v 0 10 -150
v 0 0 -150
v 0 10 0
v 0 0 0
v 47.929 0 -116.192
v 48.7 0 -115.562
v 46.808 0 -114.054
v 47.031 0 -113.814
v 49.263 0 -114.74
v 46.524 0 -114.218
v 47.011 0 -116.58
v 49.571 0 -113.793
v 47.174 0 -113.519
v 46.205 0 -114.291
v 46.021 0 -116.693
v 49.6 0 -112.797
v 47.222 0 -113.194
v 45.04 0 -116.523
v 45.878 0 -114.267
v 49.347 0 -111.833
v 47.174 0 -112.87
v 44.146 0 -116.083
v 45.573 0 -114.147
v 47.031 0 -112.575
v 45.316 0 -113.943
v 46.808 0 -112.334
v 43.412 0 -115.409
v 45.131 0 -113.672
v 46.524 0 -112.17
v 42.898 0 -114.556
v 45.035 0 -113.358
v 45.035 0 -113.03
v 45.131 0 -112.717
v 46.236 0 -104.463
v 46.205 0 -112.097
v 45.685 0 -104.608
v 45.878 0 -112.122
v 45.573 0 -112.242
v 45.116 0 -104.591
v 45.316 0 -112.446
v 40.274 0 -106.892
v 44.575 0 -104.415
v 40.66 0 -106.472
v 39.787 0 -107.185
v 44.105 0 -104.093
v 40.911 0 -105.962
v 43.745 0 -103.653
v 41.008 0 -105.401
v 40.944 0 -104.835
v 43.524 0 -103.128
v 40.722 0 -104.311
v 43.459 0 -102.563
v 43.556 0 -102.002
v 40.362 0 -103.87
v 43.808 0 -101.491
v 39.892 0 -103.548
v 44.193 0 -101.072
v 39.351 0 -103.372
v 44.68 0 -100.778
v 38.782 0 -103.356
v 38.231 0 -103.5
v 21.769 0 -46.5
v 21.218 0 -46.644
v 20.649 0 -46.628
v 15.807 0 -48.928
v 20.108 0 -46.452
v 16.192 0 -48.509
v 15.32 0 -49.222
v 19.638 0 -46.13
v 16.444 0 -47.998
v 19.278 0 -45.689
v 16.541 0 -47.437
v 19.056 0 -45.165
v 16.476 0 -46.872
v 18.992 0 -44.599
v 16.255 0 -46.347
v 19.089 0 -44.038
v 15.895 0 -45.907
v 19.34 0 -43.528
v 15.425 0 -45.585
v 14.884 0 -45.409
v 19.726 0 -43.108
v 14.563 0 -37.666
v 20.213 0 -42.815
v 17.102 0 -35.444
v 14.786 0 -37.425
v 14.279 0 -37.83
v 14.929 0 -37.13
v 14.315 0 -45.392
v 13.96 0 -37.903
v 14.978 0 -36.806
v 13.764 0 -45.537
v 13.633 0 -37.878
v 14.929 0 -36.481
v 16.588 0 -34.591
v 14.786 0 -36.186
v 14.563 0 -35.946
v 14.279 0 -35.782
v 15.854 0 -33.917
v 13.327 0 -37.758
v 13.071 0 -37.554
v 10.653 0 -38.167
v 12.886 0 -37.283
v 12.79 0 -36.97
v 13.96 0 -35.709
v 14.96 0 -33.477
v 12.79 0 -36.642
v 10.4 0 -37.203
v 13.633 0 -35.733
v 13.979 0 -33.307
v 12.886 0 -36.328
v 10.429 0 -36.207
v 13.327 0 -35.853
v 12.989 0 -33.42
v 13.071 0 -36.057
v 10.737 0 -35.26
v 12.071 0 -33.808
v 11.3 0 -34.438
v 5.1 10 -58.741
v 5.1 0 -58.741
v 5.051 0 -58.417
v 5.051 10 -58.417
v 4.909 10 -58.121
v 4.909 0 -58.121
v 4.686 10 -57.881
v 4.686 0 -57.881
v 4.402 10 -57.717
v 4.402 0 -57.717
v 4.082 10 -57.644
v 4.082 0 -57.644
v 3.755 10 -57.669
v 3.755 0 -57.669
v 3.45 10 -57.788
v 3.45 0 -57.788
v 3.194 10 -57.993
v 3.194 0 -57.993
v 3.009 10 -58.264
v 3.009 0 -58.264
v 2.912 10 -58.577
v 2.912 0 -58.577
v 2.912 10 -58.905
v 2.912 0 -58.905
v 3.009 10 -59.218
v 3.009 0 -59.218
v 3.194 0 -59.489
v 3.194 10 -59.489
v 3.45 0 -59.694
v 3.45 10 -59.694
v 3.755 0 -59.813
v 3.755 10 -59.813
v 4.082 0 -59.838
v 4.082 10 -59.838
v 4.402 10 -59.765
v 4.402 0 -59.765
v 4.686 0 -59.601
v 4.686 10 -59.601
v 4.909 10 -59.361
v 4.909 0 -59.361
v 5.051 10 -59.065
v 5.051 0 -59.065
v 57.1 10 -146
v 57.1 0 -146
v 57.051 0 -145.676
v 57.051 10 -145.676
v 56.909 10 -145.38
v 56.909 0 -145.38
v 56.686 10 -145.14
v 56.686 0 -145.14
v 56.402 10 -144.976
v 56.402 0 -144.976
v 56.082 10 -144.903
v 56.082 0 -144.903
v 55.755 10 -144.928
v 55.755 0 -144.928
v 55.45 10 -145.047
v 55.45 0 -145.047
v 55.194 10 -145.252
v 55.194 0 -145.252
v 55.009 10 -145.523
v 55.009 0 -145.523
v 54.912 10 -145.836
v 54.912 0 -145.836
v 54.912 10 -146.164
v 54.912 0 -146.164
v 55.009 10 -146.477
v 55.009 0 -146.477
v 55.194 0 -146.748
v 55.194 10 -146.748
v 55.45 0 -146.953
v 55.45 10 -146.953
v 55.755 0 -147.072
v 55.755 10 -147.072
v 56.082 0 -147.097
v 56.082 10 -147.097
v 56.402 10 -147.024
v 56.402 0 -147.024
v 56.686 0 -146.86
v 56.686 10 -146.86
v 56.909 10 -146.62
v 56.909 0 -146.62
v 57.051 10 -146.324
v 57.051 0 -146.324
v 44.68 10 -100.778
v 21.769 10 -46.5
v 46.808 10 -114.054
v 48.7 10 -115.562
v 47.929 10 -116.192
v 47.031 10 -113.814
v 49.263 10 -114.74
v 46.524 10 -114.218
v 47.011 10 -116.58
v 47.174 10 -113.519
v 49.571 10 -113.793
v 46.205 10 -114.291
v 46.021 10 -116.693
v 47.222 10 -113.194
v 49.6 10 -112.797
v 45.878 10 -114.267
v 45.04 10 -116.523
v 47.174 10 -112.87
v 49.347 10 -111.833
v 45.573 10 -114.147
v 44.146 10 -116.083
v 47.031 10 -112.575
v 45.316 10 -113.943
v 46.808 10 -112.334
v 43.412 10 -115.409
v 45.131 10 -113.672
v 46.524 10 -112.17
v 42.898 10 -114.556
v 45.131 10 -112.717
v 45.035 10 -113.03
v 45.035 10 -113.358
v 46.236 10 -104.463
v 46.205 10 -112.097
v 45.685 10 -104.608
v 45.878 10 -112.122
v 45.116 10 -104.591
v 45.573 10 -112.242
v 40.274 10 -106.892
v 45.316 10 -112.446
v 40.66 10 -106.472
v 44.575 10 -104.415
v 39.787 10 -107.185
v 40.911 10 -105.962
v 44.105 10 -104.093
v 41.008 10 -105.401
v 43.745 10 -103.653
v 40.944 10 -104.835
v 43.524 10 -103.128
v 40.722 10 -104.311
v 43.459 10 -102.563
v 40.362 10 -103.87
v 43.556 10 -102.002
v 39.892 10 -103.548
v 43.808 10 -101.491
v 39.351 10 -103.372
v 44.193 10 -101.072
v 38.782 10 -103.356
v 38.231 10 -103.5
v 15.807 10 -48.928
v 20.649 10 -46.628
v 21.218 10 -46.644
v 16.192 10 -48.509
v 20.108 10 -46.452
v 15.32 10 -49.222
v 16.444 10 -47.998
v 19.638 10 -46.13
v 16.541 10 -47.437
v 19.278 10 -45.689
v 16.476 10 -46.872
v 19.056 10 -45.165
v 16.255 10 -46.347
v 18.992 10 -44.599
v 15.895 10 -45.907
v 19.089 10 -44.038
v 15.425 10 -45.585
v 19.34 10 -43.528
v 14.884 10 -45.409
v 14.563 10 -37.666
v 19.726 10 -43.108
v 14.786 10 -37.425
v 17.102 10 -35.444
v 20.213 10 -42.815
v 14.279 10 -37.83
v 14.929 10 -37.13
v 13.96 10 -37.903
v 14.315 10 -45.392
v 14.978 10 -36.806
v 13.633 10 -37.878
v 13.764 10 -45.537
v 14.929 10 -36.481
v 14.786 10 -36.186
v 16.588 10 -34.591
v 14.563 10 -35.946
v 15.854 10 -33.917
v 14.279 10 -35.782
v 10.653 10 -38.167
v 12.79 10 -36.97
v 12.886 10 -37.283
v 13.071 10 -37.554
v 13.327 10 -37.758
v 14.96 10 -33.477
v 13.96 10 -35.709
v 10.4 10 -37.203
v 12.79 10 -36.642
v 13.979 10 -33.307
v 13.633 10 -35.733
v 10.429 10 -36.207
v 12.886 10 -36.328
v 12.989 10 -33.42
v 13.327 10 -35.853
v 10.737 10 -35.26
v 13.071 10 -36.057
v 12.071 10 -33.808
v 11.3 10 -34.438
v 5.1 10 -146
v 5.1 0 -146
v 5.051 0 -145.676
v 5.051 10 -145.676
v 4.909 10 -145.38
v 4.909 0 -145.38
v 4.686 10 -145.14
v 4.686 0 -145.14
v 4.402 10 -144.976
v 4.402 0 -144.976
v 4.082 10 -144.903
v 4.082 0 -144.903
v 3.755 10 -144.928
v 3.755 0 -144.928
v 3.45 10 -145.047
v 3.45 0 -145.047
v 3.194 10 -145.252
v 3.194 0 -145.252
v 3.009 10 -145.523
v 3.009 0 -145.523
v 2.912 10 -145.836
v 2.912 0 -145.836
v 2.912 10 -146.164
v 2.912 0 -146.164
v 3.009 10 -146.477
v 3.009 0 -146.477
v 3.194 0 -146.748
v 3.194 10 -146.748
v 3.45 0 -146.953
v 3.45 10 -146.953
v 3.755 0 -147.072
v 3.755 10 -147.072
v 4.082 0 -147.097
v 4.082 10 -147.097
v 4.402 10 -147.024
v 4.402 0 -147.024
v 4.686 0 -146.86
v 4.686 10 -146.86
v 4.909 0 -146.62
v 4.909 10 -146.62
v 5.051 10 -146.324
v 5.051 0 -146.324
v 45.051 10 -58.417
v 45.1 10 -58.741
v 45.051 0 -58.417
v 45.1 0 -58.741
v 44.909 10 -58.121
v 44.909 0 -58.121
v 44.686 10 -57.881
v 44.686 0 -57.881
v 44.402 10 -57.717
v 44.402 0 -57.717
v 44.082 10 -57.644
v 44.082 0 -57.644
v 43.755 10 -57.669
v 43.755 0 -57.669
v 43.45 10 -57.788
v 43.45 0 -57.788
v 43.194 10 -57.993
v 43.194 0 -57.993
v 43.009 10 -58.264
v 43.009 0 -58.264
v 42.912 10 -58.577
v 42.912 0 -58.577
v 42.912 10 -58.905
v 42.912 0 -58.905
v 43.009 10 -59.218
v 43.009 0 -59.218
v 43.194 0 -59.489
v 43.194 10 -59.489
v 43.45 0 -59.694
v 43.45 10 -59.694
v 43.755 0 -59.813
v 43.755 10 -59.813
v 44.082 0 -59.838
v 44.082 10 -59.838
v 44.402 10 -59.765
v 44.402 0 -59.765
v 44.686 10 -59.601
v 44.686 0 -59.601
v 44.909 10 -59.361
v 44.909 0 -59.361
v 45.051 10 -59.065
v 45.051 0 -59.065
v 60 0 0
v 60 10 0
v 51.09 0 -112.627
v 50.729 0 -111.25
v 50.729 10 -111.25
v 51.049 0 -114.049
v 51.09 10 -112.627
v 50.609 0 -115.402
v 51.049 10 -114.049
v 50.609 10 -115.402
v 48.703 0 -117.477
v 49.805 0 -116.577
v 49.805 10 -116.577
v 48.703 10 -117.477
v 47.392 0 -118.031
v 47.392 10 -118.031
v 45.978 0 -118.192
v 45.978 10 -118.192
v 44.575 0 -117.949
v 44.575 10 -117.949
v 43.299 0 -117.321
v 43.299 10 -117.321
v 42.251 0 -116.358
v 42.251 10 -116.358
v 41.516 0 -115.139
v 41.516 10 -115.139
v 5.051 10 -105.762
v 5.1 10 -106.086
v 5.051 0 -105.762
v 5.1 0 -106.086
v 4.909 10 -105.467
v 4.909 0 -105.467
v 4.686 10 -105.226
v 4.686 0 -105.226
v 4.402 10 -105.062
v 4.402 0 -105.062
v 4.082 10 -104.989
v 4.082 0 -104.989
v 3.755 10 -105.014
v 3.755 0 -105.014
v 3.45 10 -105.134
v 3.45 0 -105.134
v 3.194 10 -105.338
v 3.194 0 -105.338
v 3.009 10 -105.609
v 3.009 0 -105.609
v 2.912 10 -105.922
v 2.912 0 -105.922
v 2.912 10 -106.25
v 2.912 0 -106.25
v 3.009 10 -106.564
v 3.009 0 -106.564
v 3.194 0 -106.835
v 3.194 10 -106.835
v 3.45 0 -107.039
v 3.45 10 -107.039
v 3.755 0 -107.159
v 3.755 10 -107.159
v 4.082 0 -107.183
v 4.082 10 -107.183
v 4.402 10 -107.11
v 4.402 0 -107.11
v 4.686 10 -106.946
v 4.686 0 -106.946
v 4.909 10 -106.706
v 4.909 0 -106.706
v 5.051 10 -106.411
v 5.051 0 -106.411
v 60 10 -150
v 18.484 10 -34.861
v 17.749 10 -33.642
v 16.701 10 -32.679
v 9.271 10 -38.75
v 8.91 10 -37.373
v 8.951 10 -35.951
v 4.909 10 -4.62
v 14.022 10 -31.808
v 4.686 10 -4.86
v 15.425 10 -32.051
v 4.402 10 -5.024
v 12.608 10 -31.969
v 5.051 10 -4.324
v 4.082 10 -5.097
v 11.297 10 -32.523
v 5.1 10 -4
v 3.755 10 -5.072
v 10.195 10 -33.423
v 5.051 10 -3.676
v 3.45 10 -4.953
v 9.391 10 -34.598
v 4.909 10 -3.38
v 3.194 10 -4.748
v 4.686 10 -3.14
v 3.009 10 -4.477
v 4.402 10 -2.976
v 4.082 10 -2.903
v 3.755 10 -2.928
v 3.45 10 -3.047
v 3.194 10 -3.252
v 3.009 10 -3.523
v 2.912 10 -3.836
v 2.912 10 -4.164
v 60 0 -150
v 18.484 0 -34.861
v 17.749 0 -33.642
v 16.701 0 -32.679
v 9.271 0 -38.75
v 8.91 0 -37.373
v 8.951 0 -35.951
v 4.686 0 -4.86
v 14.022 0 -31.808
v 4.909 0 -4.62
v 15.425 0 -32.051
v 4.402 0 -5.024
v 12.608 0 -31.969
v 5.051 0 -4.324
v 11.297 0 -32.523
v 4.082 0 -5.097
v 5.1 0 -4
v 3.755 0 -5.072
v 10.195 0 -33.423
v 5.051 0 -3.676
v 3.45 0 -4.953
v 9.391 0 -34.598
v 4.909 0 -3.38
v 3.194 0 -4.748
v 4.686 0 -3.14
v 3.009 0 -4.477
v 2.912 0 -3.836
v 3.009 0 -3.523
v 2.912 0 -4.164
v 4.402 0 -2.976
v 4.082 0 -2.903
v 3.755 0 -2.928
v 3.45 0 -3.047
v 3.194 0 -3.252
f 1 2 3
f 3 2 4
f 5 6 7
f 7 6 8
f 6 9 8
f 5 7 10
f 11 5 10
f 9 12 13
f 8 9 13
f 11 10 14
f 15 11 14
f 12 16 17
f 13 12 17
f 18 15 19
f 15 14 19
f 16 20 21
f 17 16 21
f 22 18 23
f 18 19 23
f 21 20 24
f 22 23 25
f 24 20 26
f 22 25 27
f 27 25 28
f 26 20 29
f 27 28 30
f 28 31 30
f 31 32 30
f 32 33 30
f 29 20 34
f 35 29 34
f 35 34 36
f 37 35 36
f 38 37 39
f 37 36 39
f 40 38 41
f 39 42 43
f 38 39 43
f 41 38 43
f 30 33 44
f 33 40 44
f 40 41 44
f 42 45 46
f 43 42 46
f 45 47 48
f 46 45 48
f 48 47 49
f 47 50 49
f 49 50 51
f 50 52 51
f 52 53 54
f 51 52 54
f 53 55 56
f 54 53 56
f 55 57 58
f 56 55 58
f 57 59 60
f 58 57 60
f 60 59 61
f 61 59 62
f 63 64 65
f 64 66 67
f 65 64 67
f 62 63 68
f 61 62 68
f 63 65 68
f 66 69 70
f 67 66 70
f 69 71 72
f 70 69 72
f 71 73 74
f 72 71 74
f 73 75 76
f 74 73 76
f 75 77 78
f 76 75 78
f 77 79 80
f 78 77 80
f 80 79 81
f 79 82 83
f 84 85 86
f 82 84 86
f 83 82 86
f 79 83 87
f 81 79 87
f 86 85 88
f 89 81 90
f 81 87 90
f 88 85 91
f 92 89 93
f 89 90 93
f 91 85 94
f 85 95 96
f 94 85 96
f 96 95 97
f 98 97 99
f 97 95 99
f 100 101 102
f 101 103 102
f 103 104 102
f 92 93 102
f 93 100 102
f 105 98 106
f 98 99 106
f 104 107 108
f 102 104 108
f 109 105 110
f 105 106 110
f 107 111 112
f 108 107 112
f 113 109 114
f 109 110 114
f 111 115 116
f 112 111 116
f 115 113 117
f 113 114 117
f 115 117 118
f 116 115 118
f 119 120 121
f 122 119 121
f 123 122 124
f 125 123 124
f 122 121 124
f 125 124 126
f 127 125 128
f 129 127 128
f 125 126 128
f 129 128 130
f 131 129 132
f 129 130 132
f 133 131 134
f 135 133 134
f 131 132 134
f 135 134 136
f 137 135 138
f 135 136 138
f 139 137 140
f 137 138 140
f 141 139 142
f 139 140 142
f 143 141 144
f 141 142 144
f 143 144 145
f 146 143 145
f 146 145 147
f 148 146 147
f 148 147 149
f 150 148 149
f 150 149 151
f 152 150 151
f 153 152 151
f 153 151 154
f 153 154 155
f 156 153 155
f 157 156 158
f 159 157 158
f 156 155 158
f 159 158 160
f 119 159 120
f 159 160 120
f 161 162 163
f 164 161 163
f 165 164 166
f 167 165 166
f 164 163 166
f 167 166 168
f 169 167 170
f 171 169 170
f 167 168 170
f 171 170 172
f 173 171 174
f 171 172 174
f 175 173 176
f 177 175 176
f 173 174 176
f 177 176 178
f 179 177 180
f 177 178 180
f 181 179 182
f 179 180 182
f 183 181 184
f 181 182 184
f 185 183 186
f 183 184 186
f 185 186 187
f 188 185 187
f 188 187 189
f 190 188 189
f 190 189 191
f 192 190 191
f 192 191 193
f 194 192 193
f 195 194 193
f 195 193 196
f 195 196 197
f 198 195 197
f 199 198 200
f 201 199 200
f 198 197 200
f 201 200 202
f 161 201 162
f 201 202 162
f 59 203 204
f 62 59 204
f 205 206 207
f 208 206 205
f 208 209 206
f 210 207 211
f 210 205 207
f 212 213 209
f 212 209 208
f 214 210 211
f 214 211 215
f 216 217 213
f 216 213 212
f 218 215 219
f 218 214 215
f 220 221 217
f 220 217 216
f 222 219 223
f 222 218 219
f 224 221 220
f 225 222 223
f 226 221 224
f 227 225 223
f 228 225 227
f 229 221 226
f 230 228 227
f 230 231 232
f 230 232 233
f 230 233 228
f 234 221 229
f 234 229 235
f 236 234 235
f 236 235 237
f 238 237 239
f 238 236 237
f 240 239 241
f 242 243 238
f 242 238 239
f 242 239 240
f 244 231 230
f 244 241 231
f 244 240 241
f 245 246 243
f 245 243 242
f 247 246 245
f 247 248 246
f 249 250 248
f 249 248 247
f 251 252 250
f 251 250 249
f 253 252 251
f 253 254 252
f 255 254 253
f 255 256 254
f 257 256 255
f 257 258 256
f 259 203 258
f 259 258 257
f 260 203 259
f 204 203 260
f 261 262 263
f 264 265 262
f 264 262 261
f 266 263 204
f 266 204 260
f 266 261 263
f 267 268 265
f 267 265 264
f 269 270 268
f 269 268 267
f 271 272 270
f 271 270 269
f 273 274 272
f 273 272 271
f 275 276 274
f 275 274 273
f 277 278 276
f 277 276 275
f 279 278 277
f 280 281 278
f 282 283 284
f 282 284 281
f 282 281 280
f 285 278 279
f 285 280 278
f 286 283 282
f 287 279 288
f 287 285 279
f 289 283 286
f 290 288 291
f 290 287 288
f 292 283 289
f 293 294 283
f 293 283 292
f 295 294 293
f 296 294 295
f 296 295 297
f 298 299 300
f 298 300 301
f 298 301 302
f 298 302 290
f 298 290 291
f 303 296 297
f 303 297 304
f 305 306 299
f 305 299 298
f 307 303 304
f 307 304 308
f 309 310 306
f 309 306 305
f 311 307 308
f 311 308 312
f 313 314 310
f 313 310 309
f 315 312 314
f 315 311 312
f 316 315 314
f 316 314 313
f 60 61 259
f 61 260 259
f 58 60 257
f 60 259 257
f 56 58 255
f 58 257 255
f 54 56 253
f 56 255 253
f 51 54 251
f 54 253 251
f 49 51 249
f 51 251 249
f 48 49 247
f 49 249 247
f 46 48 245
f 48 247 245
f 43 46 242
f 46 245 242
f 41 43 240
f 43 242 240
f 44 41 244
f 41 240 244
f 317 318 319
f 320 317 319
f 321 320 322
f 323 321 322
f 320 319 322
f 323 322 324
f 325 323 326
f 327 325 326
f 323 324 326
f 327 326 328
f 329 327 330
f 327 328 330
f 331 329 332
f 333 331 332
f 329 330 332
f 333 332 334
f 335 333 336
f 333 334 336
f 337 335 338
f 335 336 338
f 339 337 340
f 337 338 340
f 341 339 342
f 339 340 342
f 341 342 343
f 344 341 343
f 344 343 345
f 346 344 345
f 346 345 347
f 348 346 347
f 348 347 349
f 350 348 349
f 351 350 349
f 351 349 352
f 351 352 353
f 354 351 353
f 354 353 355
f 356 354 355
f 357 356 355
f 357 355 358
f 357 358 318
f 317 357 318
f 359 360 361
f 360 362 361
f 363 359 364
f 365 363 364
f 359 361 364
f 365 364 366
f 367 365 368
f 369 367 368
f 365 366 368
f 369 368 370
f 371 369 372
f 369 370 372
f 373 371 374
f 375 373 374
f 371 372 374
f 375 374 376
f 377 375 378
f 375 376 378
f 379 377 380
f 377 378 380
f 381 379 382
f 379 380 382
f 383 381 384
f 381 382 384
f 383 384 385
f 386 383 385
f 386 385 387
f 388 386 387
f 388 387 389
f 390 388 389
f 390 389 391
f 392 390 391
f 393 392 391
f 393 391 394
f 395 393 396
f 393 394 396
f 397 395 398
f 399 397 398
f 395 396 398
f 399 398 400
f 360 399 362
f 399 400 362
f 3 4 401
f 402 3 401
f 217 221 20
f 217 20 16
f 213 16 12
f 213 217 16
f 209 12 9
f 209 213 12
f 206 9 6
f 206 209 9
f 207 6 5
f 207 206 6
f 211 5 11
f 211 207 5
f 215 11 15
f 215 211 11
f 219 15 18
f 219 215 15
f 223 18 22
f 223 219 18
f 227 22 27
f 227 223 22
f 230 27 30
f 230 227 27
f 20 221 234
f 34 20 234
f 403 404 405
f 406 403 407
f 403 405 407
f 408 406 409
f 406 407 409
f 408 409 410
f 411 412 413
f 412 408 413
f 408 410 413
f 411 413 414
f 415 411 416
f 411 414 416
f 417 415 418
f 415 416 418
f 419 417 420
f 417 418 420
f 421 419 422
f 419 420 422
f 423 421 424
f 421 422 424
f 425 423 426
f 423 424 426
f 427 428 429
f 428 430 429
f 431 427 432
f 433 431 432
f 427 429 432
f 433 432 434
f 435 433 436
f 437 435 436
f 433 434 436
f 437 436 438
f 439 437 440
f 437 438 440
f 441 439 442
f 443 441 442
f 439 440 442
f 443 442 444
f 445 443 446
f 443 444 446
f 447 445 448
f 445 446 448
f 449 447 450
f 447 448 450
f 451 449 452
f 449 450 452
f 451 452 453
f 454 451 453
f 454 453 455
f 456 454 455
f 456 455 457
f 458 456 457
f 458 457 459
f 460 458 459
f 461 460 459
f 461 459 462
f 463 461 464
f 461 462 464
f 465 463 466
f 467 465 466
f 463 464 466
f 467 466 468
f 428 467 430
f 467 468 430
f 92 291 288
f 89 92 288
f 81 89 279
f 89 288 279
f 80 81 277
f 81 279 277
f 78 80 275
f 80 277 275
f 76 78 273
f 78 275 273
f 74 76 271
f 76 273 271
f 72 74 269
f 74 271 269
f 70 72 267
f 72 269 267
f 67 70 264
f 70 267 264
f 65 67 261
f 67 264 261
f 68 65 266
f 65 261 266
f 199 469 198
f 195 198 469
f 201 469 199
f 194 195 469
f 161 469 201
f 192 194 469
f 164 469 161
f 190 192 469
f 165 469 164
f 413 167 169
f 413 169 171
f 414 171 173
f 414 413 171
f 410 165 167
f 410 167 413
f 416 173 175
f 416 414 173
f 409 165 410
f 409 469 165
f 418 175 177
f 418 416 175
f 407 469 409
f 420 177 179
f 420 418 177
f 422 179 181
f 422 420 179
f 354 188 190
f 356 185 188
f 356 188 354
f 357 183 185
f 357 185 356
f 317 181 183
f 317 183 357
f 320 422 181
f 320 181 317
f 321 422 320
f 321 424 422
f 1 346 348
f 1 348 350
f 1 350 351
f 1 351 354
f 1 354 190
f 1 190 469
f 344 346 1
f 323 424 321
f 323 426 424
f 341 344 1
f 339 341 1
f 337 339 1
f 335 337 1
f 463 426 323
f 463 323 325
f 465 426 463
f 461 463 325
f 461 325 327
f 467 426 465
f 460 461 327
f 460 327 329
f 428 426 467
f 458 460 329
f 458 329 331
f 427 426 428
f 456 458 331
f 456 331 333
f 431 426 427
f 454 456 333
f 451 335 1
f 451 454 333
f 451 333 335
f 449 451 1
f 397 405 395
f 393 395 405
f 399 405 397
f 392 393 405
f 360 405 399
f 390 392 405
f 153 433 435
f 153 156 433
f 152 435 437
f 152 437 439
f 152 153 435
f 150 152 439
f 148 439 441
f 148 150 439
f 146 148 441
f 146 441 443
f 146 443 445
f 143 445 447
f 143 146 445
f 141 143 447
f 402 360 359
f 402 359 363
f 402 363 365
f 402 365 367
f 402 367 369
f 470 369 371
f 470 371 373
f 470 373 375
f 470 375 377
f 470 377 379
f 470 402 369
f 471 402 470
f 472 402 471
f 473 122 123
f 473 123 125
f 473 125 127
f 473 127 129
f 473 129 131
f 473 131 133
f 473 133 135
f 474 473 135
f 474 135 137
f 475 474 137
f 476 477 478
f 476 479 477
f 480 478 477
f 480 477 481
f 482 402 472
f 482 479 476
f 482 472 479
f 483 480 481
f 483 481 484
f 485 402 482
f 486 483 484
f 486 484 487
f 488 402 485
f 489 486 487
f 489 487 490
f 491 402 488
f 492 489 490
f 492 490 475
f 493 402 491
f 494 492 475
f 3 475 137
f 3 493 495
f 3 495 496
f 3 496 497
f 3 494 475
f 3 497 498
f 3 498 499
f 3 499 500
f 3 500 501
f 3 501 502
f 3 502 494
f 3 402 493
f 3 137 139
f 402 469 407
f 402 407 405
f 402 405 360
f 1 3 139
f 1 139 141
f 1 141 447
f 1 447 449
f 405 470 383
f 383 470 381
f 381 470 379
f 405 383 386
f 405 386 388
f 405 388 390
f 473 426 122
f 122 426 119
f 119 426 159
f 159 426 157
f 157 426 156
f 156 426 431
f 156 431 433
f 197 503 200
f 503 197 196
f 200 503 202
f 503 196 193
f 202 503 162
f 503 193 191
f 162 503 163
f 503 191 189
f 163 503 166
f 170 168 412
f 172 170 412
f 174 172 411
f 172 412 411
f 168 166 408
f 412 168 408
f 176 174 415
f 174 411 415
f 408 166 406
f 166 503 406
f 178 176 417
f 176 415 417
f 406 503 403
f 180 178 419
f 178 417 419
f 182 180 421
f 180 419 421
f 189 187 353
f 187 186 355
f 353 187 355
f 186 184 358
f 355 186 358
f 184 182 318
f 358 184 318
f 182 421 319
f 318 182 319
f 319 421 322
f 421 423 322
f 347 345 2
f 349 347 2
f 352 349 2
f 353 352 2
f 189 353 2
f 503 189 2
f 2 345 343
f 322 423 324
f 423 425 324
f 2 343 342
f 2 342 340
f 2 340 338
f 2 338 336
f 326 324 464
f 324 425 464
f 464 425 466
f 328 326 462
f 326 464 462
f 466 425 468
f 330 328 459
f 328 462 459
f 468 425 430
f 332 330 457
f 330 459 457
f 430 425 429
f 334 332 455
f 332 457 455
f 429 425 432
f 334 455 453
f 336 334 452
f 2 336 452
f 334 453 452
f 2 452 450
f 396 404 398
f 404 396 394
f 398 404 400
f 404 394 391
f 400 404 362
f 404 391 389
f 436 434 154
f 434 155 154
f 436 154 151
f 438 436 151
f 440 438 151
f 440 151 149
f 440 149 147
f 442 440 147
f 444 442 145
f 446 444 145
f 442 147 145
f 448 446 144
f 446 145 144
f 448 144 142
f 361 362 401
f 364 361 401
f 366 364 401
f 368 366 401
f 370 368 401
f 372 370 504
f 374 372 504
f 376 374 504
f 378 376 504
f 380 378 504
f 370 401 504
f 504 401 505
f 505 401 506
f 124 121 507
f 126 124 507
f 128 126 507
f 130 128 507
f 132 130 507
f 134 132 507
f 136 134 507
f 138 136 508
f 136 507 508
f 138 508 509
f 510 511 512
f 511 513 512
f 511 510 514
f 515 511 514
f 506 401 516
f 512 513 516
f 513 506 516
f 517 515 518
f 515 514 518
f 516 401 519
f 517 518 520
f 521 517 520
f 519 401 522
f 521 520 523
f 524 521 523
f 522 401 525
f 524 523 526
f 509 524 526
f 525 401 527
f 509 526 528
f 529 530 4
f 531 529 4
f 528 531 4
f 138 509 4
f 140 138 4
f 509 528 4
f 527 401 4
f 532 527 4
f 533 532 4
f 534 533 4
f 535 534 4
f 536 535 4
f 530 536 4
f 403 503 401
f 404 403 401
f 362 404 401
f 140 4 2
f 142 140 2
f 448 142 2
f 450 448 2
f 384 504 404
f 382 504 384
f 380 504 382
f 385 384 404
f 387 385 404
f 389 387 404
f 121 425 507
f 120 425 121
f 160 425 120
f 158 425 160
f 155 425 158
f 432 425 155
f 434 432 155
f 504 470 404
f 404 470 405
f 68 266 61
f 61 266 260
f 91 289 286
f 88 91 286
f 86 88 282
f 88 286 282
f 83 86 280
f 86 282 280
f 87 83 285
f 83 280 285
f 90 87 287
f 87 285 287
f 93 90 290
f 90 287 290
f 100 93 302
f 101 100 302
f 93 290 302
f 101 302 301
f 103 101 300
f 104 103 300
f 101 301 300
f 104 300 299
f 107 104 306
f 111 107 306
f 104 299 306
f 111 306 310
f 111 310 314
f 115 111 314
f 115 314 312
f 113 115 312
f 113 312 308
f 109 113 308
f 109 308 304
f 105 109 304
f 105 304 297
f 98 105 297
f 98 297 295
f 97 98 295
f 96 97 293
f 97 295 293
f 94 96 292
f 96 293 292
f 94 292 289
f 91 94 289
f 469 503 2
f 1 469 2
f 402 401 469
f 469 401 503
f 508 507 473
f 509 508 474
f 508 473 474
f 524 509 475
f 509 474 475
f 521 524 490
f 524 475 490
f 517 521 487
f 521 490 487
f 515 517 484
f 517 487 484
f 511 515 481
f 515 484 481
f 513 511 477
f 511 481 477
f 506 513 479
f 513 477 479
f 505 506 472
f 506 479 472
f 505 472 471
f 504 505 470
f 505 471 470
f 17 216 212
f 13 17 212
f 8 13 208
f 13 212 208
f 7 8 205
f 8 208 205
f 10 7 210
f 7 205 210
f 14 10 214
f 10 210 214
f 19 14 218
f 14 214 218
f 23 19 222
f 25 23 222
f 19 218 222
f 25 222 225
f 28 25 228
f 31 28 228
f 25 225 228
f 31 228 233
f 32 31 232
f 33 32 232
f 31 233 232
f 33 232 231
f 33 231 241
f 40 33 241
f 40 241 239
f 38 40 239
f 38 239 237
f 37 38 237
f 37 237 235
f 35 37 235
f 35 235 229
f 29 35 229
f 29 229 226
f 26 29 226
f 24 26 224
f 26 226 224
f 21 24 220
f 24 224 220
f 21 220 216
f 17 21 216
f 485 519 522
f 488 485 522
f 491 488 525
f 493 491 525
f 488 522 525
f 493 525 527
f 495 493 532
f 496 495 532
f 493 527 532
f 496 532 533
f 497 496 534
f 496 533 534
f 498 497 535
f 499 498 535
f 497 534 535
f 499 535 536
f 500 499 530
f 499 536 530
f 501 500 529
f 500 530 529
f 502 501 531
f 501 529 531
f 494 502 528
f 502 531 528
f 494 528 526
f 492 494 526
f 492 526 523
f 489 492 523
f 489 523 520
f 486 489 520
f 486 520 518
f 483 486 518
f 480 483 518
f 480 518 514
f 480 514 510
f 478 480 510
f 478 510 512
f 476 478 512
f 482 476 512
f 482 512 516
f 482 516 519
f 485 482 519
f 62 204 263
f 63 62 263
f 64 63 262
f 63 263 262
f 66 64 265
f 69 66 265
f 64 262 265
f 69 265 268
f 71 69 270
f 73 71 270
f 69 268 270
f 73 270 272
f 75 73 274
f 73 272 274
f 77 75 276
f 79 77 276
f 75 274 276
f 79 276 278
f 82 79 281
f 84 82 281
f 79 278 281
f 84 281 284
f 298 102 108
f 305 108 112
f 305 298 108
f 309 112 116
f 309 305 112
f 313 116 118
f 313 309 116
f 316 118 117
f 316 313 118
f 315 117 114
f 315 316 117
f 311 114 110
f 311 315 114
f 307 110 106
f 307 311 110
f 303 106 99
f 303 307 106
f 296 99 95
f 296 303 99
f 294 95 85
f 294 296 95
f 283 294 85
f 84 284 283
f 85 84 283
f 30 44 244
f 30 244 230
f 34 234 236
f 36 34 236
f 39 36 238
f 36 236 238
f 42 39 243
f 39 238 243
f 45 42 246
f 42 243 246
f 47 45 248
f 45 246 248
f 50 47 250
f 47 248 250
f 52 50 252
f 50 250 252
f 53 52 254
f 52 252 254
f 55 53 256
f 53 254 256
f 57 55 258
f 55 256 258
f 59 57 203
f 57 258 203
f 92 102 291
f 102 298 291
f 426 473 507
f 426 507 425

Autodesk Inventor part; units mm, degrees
ref_plane "YZ Plane" through (0, 0, 0) normal (1, 0, 0) x (0, 1, 0)
ref_plane "XZ Plane" through (0, 0, 0) normal (0, 1, 0) x (-1, 0, 0)
ref_plane "XY Plane" through (0, 0, 0) normal (0, 0, 1) x (1, 0, 0)
sketch "Sketch1" plane through (0, 0, 0) normal (0, 1, 0) x (-1, 0, 0)
  line L0 (0, 0) -> (-60, 0)
  line L1 (-60, 0) -> (-60, -150)
  line L2 (-60, -150) -> (0, -150)
  line L3 (0, -150) -> (0, 0)
  dimension "d0" = 150
  dimension "d1" = 60
extrude "Extrusion1" add sketch "Sketch1" along normal blind 10
sketch "Sketch2" plane through (0, 0, 0) normal (0, -1, 0) x (1, 0, 0)
  circle A0 centre (4, -146) radius 1.325 projected
  circle A1 centre (56, -146) radius 1.325 projected
  circle A2 centre (4, -4) radius 1.325 projected
  circle A3 centre (4, -58.741) radius 1.325 projected
  circle A4 centre (44, -58.741) radius 1.325 projected
  circle A5 centre (4, -106.0864) radius 1.325 projected
  point P0 (0, 0)
sketch "Sketch3" plane through (0, 0, 0) normal (0, -1, 0) x (1, 0, 0)
  circle A0 centre (4, -146) radius 1.325 projected
  circle A1 centre (4, -146) radius 1.1
  circle A2 centre (56, -146) radius 1.325 projected
  circle A3 centre (56, -146) radius 1.1
  circle A4 centre (4, -106.0864) radius 1.1
  circle A5 centre (4, -58.741) radius 1.1
  circle A6 centre (44, -58.741) radius 1.1
  circle A7 centre (4, -4) radius 1.1
  point P0 (0, 0)
  dimension "d4" = 2.2
  dimension "d5" = 2.2
  dimension "d6" = 2.2
  dimension "d7" = 2.2
  dimension "d8" = 2.2
  dimension "d9" = 2.2
extrude "Extrusion2" cut sketch "Sketch3" against normal blind 10 contours A1 | A3 | A4 | A5 | A6 | A7
thread "Thread1" size "M2.5x0.45" class "6H" standard "ANSI Metric M Profile" length 10
thread "Thread2" size "M2.5x0.45" class "6H" standard "ANSI Metric M Profile" length 10
thread "Thread3" size "M2.5x0.45" class "6H" standard "ANSI Metric M Profile" length 10
thread "Thread4" size "M2.5x0.45" class "6H" standard "ANSI Metric M Profile" length 10
thread "Thread5" size "M2.5x0.45" class "6H" standard "ANSI Metric M Profile" length 10
thread "Thread6" size "M2.5x0.45" class "6H" standard "ANSI Metric M Profile" length 10
sketch "Sketch4" plane through (0, 10, 0) normal (0, 1, 0) x (1, 0, 0)
  circle A0 centre (13.8775, 36.8056) radius 1.1
  circle A1 centre (46.1225, 113.1944) radius 1.1
  arc A2 (36.6332, 8.5) -> (15.5373, 47.236) centre (30, 30) ccw projected
  arc A3 (30.5692, 97.5072) -> (51.5, 113.3668) centre (30, 120) ccw projected
  arc A4 (36.6332, 8.5) -> (15.5373, 47.236) centre (30, 30) ccw projected
  line L0 (9.2711, 38.75) -> (41.5161, 115.1389)
  line L1 (18.4839, 34.8611) -> (50.7289, 111.25)
  arc A5 (9.2711, 38.75) -> (18.4839, 34.8611) centre (13.8775, 36.8056) ccw
  arc A6 (50.7289, 111.25) -> (41.5161, 115.1389) centre (46.1225, 113.1944) ccw
  line L2 (30, 30) -> (22.4986, 30)
  line L3 (30, 120) -> (36.6332, 120)
  line L4 (41.5161, 115.1389) -> (50.7289, 111.25)
  line L5 (9.2711, 38.75) -> (18.4839, 34.8611)
  line L6 (30, 30) -> (13.8775, 36.8056)
  line L7 (46.1225, 113.1944) -> (30, 120)
  line L8 (13.8775, 36.8056) -> (46.1225, 113.1944)
  circle A7 centre (30, 30) radius 17.5
  circle A8 centre (30, 120) radius 17.5
  circle A9 centre (13.8775, 36.8056) radius 3.5
  circle A10 centre (46.1225, 113.1944) radius 3.5
  line L9 (10.653, 38.1667) -> (42.898, 114.5556)
  line L10 (49.347, 111.8333) -> (17.102, 35.4444)
  circle A11 centre (14.5419, 47.3795) radius 2
  line L11 (14.5419, 47.3795) -> (20.9909, 44.6573)
  circle A12 centre (20.9909, 44.6573) radius 2
  circle A13 centre (39.0091, 105.3427) radius 2
  circle A14 centre (45.4581, 102.6205) radius 2
  line L12 (39.0091, 105.3427) -> (45.4581, 102.6205)
  point P0 (0, 0)
  point P1 (45.6947, 112.181)
  point P2 (45.6631, 112.195)
  point P3 (44.4457, 110.1222)
  point P4 (44.7614, 109.9699)
  point P5 (13.7641, 45.5369)
  point P6 (15.3197, 49.2221)
  point P7 (38.2313, 103.5001)
  point P8 (39.7869, 107.1853)
  point P9 (46.2359, 104.4631)
  point P10 (44.6803, 100.7779)
  point P11 (21.7687, 46.4999)
  point P12 (20.2131, 42.8147)
  point P13 (38.1416, 107.1448)
  point P14 (37.4074, 104.145)
  point P15 (36.7532, 103.8555)
  point P16 (40.801, 106.2309)
  point P17 (37.1127, 104.7073)
  point P18 (47.3889, 118.0314)
  point P19 (22.8873, 45.2927)
  point P20 (22.5926, 45.855)
  point P21 (23.2468, 46.1445)
  point P22 (47.1543, 116.5389)
  dimension "d27" = 35
  dimension "d24" = 10
  dimension "d25" = 22.5
  dimension "d26" = 35
  dimension "d28" = 7
  dimension "d29" = 7
  dimension "d30" = 4
  dimension "d31" = 4
  dimension "d32" = 90
  dimension "d33" = 4
  dimension "d34" = 4
  dimension "d35" = 10
  dimension "d36" = 10
  dimension "d39" = 2.2
  dimension "d40" = 2.2
extrude "Extrusion3" cut sketch "Sketch4" against normal blind 10 contours A0 L5 A7 | A7 L8 A0 | A0 A7 L5 | L8 L5 A0 | A7 A0 L5 | L10 A12 L1 L5 | L5 A5 A7 A9 | A12 L11 A7 | A7 L11 L10 A12 | A7 A5 L5 A9 | L10 A7 A12 L1 | L5 L0 A11 L9 | L11 A12 L10 A7 | A7 L10 L11 | A11 L0 L9 | L9 L11 A11 | L11 L9 A11 | L10 A12 A7 | L10 A2 L1 A7 A12 | A12 A7 L1 | L10 A14 L1 A2 | L0 A3 L9 A11 | A14 A3 L12 L10 | L10 A3 A14 L1 | A3 L0 A8 A13 L9 | A14 L12 A3 | L12 A3 L10 | A13 A8 L9 | L9 A8 L12 A13 | L12 A14 L10 A3 | L12 A8 A13 | L0 A13 A8 | A14 A3 L1 | L10 A14 A3 | L9 L12 A8 | A8 A13 L0 L9 | L10 L4 A3 A14 | L8 L4 A1 | A1 A8 L8 | A10 A8 A6 L4 | L12 L9 A13 A8 | A1 L4 A8 | L4 A8 A1 | L4 A1 A8 | L9 A13 L0 L4 | L4 A6 A8 A10
equation "\"d27\" = d26"
equation "\"d31\" = d30"
equation "\"d33\" = d30"
equation "\"d34\" = d30"
properties part number "FlexK7Holder"
